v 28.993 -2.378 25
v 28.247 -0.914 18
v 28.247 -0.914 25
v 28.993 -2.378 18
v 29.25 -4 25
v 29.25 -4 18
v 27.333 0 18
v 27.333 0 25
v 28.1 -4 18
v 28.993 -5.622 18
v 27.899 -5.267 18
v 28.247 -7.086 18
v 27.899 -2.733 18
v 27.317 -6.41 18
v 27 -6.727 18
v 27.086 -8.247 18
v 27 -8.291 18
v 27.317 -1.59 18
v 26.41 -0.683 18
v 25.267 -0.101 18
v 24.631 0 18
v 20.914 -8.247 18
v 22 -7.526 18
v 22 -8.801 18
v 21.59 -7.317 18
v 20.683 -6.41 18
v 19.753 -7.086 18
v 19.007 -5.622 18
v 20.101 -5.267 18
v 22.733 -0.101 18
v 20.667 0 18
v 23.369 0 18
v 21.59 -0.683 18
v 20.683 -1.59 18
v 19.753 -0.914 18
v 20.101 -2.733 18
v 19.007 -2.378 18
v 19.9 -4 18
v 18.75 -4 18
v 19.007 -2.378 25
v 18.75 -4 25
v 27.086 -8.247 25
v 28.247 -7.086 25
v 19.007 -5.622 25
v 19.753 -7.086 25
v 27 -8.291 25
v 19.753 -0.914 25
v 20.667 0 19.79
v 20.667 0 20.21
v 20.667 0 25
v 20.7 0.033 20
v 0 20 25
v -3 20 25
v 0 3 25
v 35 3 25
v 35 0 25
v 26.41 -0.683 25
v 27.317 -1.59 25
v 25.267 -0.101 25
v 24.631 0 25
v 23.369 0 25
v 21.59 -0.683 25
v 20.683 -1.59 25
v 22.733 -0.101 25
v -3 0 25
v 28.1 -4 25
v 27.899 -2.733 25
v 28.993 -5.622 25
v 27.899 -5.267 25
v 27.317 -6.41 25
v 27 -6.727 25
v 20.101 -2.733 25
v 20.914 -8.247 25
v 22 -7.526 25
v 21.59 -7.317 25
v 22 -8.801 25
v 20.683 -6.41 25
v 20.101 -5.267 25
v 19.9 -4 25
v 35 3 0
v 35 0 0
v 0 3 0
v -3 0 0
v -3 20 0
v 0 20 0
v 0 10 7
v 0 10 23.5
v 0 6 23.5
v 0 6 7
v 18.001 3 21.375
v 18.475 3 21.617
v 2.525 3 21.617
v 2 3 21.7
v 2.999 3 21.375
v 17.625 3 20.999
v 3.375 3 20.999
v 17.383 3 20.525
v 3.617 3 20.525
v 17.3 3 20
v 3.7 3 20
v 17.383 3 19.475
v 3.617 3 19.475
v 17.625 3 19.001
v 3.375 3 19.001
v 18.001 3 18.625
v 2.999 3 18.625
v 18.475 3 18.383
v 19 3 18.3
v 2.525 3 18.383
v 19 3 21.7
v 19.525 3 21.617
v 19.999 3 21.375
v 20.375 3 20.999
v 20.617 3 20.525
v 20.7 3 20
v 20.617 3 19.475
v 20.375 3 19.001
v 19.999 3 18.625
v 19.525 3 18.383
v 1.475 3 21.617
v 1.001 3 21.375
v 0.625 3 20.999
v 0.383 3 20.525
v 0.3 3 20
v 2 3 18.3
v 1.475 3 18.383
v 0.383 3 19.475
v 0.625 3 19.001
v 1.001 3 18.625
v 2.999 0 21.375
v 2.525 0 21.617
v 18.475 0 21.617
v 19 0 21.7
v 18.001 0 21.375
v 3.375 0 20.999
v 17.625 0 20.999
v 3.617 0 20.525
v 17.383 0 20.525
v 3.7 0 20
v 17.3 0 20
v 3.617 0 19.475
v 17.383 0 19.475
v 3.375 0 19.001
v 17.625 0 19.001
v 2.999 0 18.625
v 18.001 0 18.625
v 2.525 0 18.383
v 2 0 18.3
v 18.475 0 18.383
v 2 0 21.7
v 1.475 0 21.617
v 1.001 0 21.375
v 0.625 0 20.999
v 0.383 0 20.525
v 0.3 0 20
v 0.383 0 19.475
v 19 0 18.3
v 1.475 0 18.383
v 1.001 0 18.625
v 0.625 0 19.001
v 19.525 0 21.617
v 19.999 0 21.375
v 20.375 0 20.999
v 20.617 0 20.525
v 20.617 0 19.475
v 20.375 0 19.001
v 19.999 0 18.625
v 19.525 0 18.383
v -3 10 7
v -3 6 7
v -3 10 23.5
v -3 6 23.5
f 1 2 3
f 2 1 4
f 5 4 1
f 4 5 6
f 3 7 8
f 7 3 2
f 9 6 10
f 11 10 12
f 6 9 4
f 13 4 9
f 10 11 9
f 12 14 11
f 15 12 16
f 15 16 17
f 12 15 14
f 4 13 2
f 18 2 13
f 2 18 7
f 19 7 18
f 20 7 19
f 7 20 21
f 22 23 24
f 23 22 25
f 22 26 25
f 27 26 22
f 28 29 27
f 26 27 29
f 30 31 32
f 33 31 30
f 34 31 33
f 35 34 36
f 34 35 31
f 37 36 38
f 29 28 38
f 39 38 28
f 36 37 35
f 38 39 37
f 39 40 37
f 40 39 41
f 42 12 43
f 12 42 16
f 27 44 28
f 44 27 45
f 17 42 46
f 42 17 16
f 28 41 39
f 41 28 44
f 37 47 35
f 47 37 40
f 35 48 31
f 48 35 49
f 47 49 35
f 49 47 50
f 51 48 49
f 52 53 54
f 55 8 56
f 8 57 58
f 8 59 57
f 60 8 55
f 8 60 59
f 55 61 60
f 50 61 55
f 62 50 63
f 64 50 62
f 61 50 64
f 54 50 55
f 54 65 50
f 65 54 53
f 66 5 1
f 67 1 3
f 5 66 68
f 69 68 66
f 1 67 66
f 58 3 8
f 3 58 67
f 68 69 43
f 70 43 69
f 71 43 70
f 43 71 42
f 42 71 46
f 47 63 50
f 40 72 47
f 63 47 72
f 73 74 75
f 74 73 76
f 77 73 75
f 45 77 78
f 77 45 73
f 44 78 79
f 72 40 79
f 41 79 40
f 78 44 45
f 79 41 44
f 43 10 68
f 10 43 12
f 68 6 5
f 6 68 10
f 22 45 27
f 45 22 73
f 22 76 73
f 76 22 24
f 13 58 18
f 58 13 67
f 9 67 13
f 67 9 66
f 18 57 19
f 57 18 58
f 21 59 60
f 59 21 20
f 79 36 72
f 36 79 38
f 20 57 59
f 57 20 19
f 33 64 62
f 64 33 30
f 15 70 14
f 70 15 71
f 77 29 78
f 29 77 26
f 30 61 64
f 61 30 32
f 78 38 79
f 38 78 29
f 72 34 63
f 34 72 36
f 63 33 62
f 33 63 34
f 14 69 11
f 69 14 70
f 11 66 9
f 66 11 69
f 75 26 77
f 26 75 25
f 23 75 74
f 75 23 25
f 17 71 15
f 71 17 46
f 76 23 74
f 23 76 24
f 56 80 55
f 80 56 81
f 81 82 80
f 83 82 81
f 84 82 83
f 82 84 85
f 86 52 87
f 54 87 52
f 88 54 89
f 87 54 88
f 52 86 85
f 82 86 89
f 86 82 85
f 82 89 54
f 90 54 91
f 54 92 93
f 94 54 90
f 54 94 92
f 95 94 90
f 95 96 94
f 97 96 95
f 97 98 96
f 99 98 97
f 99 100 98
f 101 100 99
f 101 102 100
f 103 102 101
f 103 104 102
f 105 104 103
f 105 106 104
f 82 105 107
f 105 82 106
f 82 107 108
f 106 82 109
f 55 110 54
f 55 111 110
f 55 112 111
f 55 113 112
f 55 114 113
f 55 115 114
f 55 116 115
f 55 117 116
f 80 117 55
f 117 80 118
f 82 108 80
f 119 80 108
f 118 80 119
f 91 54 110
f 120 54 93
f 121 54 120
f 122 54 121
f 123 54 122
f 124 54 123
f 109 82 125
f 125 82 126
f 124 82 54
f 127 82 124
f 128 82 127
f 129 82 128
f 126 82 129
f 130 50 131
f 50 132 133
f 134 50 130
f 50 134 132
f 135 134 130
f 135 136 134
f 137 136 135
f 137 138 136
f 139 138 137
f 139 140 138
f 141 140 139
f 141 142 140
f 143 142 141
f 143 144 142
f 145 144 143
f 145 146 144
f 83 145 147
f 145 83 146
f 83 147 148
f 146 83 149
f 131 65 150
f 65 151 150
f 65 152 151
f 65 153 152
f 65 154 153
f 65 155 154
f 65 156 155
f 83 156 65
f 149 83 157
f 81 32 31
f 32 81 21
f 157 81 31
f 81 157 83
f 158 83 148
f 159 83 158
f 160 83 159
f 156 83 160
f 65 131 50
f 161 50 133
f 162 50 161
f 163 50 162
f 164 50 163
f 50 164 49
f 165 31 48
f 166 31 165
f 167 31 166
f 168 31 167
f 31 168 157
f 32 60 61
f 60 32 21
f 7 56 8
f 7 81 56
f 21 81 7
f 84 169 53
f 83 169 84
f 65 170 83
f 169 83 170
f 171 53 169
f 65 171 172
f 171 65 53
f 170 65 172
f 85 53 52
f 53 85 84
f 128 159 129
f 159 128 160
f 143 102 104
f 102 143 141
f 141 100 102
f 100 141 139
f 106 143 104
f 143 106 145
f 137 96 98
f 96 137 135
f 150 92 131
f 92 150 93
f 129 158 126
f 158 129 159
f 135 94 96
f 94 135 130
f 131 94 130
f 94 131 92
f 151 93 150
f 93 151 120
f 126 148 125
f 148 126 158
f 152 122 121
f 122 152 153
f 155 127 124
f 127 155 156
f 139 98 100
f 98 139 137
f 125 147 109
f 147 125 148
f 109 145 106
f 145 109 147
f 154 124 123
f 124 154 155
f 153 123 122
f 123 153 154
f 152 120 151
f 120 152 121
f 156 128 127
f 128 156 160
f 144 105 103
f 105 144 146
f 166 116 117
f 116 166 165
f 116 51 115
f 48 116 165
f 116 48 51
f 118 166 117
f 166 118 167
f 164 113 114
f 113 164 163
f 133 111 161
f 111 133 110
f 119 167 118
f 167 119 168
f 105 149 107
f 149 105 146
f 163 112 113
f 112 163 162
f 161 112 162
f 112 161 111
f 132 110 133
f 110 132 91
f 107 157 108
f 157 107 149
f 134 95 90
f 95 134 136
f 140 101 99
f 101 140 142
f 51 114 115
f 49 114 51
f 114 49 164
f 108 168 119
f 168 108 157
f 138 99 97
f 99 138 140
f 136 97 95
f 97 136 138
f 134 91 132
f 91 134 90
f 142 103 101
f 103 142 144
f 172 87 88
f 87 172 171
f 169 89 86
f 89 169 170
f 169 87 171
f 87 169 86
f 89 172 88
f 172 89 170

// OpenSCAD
// Z axis end stop for end stop xxx design

// screw holes test just fine!!


// 1 ditch slot

// 2 move holes to around rod

// 3 shorten

// 4 make length to frame longer

// 5 extend length away from frame


    translate([24, -4, 18])
    difference() {
      cylinder($fn=20, d=10.5, h=7);
      cylinder($fn=20, d=8.2, h=10);
      translate([-2, -9, 0])
      cube([5, 7, 17]);
    }


difference() {

  union() {
    // rectangle
    cube([35, 3, 25]);

    rotate([0, 0, 90])
    cube([20, 3, 25]);
  }

  // m3 hole 1
  translate([2, -5, 20])
  rotate([-90, 0, 0])
  cylinder($fn=20, d=3.4, h=10);
  
  // m3 hole 2
  translate([19, -5, 20])
  rotate([-90, 0, 0])
  cylinder($fn=20, d=3.4, h=10);
  
  // slot

  // 3 mm in
  // need a slot 16 x 4 in the end

  translate([-4, 6, 7])  
  cube([10, 4, 16.5]);


}
